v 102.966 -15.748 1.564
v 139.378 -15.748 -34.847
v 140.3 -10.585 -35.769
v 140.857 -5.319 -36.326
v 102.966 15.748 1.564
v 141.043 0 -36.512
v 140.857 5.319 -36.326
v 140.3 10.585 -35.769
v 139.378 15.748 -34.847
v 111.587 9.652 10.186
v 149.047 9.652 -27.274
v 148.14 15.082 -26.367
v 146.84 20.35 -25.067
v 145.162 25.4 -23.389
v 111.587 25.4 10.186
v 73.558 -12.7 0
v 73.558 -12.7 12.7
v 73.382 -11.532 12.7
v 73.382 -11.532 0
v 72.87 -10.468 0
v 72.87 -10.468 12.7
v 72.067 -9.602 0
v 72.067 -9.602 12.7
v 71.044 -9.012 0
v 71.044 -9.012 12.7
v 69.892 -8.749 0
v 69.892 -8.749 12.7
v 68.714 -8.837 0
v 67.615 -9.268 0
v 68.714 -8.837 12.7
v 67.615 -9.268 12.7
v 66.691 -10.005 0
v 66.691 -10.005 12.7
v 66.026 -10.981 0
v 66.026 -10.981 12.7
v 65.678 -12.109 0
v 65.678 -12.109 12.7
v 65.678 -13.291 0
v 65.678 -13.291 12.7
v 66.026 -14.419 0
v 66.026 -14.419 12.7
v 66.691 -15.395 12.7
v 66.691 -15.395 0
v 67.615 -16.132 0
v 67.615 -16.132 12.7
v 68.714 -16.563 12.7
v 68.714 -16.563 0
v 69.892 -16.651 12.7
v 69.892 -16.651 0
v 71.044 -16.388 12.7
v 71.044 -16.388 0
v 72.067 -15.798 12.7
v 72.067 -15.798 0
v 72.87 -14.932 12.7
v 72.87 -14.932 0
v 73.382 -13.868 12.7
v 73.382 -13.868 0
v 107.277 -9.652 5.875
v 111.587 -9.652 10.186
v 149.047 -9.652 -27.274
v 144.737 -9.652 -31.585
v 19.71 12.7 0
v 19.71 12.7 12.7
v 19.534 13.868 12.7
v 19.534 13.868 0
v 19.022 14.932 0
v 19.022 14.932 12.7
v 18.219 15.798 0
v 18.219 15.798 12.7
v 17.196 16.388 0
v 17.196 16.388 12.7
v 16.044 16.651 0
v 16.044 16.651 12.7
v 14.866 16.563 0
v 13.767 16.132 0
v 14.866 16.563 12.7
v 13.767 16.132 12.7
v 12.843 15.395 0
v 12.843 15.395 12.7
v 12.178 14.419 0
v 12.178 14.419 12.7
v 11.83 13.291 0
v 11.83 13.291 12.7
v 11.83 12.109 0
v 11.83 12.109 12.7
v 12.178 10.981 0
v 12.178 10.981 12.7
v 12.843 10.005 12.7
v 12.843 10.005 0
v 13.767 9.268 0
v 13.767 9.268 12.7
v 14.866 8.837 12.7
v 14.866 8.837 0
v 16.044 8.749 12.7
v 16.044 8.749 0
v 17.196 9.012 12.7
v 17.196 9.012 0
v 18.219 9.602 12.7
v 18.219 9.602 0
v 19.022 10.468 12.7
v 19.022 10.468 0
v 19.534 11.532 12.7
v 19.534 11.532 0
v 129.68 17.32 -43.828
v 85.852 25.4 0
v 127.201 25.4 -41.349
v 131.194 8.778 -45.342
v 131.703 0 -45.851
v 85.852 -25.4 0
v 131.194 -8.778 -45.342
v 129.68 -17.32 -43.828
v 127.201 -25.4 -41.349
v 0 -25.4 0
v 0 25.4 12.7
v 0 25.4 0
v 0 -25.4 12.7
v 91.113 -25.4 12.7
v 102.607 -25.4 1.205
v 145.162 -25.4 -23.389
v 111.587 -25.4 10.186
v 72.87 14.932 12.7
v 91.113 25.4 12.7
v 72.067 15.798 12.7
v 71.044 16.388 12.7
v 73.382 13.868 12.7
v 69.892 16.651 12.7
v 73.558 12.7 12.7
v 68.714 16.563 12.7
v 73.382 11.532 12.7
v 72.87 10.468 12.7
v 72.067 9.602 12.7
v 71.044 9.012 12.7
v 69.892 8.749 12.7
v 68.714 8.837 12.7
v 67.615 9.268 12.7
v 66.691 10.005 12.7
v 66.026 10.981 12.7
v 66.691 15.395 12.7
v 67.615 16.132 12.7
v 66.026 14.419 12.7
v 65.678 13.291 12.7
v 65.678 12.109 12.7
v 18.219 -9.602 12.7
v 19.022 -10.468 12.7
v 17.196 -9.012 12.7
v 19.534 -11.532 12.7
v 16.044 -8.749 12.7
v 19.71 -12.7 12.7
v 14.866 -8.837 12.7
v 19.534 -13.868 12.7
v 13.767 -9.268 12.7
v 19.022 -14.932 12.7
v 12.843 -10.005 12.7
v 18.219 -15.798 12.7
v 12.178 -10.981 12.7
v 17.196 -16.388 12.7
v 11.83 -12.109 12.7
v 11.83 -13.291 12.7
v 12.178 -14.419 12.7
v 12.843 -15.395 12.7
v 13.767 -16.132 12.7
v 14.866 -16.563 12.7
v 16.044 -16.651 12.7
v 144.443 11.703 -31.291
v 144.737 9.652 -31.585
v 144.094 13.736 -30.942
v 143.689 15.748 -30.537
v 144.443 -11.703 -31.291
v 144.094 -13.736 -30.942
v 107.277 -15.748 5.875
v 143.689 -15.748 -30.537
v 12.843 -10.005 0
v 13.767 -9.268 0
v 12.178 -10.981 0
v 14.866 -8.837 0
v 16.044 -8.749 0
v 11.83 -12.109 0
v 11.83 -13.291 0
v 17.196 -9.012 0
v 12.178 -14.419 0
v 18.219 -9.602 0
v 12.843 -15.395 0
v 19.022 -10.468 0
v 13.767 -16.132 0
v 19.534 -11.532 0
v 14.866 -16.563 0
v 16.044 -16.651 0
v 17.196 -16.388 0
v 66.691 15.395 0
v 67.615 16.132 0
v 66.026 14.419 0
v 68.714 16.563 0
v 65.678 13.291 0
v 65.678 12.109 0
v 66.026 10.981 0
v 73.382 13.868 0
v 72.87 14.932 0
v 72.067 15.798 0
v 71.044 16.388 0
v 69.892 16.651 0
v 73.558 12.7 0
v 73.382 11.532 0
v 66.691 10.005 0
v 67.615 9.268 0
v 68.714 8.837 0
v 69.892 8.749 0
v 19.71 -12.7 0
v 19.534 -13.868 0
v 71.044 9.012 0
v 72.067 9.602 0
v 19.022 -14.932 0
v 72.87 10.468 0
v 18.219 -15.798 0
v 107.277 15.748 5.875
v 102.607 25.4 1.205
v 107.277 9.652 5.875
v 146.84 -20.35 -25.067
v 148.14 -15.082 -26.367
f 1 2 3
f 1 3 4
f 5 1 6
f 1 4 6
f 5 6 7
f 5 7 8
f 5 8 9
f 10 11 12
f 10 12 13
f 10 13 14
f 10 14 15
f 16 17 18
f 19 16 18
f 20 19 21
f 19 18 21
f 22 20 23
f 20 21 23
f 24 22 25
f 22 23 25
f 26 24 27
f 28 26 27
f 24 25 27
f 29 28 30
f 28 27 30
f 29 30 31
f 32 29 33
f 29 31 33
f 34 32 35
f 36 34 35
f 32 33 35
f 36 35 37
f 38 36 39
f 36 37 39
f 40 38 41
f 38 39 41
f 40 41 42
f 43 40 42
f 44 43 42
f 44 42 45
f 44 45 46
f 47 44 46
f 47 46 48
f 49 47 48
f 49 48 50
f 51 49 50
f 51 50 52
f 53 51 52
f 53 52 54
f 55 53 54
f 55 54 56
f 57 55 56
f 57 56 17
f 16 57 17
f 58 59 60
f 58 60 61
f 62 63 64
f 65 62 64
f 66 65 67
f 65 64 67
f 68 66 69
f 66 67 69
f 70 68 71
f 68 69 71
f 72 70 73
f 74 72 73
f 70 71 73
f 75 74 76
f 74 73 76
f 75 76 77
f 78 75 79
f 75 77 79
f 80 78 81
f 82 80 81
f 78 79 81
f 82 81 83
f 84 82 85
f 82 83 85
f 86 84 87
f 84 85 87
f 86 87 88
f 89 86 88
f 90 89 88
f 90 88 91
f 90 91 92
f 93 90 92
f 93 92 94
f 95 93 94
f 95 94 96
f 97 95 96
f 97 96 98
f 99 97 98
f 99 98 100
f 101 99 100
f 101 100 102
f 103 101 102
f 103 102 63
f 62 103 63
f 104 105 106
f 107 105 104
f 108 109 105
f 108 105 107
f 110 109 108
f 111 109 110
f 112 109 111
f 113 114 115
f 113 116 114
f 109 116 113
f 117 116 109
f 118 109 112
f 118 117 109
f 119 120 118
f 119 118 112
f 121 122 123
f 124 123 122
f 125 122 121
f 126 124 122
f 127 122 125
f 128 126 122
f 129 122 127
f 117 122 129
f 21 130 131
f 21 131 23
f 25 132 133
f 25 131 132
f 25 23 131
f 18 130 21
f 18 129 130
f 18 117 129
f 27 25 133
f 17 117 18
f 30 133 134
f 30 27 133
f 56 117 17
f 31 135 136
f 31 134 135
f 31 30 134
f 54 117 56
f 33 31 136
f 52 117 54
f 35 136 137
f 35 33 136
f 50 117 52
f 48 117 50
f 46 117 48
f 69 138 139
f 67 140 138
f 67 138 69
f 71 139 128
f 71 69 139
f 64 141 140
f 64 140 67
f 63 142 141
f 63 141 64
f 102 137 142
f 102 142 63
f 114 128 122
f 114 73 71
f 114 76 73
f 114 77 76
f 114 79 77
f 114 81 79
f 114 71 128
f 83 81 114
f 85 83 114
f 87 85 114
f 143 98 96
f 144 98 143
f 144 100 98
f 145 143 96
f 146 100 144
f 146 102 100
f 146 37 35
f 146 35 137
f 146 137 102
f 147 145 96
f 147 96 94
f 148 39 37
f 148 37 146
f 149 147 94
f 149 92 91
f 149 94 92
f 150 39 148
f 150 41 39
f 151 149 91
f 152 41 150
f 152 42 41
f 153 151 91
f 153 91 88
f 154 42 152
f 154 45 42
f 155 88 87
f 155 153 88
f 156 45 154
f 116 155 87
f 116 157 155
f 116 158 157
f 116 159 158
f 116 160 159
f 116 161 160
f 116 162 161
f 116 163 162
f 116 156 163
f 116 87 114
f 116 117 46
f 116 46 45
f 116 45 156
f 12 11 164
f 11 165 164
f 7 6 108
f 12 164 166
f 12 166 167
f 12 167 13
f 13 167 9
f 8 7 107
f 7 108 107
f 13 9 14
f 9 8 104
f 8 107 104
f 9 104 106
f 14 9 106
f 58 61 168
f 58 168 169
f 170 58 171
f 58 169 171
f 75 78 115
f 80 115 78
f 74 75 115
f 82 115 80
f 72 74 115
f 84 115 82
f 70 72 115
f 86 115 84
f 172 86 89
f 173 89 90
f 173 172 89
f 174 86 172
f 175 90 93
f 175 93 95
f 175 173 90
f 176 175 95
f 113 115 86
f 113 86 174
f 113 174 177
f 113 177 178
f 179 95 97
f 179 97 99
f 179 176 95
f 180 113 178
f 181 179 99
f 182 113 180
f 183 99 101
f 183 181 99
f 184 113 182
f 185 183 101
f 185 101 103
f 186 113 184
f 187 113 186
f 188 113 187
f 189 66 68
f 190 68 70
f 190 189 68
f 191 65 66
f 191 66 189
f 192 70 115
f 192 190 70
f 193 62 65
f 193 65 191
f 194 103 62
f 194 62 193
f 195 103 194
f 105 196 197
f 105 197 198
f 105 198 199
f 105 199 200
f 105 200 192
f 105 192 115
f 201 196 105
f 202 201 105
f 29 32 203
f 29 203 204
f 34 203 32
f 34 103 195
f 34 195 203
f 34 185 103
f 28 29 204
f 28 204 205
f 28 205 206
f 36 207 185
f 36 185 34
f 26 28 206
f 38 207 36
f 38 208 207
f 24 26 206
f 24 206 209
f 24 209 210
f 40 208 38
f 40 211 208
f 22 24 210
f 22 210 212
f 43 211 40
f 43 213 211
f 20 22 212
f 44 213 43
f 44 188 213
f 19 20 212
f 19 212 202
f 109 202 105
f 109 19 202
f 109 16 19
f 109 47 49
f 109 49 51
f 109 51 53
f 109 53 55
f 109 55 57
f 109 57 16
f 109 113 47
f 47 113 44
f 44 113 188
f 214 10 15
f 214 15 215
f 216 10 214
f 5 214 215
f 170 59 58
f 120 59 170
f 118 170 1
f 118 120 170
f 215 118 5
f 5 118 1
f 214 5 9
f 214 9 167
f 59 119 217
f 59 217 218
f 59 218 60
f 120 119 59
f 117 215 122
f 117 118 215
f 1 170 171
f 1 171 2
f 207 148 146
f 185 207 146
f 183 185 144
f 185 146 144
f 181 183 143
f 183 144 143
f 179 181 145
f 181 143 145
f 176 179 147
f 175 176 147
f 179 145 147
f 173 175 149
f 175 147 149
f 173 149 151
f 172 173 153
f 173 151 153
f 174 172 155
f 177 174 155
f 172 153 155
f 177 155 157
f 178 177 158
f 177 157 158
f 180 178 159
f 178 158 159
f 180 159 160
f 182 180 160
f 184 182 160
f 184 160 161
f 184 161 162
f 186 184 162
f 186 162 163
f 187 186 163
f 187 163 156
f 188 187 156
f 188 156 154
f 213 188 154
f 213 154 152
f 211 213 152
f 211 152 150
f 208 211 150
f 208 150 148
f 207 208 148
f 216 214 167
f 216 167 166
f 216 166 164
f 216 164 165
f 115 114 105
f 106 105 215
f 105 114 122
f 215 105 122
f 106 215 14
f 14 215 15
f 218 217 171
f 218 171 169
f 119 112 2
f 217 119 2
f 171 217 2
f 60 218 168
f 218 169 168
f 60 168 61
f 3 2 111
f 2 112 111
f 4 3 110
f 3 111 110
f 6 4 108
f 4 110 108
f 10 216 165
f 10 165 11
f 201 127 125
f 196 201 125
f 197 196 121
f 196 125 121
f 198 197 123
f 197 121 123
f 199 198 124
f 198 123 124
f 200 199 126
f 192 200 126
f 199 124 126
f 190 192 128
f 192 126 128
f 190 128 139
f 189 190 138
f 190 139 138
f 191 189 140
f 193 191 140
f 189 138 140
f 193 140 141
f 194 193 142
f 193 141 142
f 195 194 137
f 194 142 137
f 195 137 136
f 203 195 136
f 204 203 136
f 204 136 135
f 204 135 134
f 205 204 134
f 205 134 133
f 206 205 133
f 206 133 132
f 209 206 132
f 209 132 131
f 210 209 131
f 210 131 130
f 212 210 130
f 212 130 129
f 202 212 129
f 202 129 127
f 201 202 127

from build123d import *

# Parameters (mm, degrees)
F1_DEPTH = 25.4
F3_DEPTH = 134.531275
F5_DEPTH = 25.4
F6_R     = 3.9624
F7_DEPTH = 25.4


with BuildPart() as f1:
    # F0 (on Front) → F1 (new body, symmetric)
    with BuildSketch(Plane.XZ):
        Polygon((0, 12.7), (0, 0), (85.852, 0), (131.70327, -45.85127), (149.663782, -27.890758), (111.587496, 10.185528), (102.60724, 1.205272), (91.112512, 12.7), align=None)
    extrude(amount=F1_DEPTH, both=True)

    # F2 (on face) → F3 (cut, through all)
    with BuildSketch(Plane(origin=(88.77727, 0, -88.77727), x_dir=(0, 1, 0), z_dir=(0.707107, 0, -0.707107))):
        Polygon((9.652, 86.106531), (-9.652, 86.106531), (-9.652, 80.010531), (-15.748, 80.010531), (-15.748, 73.914531), (15.748, 73.914531), (15.748, 80.010531), (9.652, 80.010531), align=None)
    extrude(amount=-F3_DEPTH, mode=Mode.SUBTRACT)

    # F4 (on face) → F5 (cut)
    with BuildSketch(Plane(origin=(42.926, 0, 42.926), x_dir=(0.707107, 0, -0.707107), z_dir=(-0.707107, 0, -0.707107))):
        with BuildLine():
            ThreePointArc((119.183037, 25.4), (123.934026, 13.092922), (125.550019, 0))
            Line((125.550019, 0), (125.550019, 25.4))
            Line((125.550019, 25.4), (119.183037, 25.4))
        make_face()
        with BuildLine():
            ThreePointArc((125.550019, 0), (123.934026, -13.092922), (119.183037, -25.4))
            Line((119.183037, -25.4), (125.550019, -25.4))
            Line((125.550019, -25.4), (125.550019, 0))
        make_face()
    extrude(amount=-F5_DEPTH, mode=Mode.SUBTRACT)

    # F6 (on face) → F7 (cut)
    with BuildSketch(Plane.XY.offset(12.7)):
        with Locations((69.596, 12.7)):
            Circle(F6_R)
        with Locations((15.748, 12.7)):
            Circle(F6_R)
        with Locations((15.748, -12.7)):
            Circle(F6_R)
        with Locations((69.596, -12.7)):
            Circle(F6_R)
    extrude(amount=-F7_DEPTH, mode=Mode.SUBTRACT)


solid = f1.part
